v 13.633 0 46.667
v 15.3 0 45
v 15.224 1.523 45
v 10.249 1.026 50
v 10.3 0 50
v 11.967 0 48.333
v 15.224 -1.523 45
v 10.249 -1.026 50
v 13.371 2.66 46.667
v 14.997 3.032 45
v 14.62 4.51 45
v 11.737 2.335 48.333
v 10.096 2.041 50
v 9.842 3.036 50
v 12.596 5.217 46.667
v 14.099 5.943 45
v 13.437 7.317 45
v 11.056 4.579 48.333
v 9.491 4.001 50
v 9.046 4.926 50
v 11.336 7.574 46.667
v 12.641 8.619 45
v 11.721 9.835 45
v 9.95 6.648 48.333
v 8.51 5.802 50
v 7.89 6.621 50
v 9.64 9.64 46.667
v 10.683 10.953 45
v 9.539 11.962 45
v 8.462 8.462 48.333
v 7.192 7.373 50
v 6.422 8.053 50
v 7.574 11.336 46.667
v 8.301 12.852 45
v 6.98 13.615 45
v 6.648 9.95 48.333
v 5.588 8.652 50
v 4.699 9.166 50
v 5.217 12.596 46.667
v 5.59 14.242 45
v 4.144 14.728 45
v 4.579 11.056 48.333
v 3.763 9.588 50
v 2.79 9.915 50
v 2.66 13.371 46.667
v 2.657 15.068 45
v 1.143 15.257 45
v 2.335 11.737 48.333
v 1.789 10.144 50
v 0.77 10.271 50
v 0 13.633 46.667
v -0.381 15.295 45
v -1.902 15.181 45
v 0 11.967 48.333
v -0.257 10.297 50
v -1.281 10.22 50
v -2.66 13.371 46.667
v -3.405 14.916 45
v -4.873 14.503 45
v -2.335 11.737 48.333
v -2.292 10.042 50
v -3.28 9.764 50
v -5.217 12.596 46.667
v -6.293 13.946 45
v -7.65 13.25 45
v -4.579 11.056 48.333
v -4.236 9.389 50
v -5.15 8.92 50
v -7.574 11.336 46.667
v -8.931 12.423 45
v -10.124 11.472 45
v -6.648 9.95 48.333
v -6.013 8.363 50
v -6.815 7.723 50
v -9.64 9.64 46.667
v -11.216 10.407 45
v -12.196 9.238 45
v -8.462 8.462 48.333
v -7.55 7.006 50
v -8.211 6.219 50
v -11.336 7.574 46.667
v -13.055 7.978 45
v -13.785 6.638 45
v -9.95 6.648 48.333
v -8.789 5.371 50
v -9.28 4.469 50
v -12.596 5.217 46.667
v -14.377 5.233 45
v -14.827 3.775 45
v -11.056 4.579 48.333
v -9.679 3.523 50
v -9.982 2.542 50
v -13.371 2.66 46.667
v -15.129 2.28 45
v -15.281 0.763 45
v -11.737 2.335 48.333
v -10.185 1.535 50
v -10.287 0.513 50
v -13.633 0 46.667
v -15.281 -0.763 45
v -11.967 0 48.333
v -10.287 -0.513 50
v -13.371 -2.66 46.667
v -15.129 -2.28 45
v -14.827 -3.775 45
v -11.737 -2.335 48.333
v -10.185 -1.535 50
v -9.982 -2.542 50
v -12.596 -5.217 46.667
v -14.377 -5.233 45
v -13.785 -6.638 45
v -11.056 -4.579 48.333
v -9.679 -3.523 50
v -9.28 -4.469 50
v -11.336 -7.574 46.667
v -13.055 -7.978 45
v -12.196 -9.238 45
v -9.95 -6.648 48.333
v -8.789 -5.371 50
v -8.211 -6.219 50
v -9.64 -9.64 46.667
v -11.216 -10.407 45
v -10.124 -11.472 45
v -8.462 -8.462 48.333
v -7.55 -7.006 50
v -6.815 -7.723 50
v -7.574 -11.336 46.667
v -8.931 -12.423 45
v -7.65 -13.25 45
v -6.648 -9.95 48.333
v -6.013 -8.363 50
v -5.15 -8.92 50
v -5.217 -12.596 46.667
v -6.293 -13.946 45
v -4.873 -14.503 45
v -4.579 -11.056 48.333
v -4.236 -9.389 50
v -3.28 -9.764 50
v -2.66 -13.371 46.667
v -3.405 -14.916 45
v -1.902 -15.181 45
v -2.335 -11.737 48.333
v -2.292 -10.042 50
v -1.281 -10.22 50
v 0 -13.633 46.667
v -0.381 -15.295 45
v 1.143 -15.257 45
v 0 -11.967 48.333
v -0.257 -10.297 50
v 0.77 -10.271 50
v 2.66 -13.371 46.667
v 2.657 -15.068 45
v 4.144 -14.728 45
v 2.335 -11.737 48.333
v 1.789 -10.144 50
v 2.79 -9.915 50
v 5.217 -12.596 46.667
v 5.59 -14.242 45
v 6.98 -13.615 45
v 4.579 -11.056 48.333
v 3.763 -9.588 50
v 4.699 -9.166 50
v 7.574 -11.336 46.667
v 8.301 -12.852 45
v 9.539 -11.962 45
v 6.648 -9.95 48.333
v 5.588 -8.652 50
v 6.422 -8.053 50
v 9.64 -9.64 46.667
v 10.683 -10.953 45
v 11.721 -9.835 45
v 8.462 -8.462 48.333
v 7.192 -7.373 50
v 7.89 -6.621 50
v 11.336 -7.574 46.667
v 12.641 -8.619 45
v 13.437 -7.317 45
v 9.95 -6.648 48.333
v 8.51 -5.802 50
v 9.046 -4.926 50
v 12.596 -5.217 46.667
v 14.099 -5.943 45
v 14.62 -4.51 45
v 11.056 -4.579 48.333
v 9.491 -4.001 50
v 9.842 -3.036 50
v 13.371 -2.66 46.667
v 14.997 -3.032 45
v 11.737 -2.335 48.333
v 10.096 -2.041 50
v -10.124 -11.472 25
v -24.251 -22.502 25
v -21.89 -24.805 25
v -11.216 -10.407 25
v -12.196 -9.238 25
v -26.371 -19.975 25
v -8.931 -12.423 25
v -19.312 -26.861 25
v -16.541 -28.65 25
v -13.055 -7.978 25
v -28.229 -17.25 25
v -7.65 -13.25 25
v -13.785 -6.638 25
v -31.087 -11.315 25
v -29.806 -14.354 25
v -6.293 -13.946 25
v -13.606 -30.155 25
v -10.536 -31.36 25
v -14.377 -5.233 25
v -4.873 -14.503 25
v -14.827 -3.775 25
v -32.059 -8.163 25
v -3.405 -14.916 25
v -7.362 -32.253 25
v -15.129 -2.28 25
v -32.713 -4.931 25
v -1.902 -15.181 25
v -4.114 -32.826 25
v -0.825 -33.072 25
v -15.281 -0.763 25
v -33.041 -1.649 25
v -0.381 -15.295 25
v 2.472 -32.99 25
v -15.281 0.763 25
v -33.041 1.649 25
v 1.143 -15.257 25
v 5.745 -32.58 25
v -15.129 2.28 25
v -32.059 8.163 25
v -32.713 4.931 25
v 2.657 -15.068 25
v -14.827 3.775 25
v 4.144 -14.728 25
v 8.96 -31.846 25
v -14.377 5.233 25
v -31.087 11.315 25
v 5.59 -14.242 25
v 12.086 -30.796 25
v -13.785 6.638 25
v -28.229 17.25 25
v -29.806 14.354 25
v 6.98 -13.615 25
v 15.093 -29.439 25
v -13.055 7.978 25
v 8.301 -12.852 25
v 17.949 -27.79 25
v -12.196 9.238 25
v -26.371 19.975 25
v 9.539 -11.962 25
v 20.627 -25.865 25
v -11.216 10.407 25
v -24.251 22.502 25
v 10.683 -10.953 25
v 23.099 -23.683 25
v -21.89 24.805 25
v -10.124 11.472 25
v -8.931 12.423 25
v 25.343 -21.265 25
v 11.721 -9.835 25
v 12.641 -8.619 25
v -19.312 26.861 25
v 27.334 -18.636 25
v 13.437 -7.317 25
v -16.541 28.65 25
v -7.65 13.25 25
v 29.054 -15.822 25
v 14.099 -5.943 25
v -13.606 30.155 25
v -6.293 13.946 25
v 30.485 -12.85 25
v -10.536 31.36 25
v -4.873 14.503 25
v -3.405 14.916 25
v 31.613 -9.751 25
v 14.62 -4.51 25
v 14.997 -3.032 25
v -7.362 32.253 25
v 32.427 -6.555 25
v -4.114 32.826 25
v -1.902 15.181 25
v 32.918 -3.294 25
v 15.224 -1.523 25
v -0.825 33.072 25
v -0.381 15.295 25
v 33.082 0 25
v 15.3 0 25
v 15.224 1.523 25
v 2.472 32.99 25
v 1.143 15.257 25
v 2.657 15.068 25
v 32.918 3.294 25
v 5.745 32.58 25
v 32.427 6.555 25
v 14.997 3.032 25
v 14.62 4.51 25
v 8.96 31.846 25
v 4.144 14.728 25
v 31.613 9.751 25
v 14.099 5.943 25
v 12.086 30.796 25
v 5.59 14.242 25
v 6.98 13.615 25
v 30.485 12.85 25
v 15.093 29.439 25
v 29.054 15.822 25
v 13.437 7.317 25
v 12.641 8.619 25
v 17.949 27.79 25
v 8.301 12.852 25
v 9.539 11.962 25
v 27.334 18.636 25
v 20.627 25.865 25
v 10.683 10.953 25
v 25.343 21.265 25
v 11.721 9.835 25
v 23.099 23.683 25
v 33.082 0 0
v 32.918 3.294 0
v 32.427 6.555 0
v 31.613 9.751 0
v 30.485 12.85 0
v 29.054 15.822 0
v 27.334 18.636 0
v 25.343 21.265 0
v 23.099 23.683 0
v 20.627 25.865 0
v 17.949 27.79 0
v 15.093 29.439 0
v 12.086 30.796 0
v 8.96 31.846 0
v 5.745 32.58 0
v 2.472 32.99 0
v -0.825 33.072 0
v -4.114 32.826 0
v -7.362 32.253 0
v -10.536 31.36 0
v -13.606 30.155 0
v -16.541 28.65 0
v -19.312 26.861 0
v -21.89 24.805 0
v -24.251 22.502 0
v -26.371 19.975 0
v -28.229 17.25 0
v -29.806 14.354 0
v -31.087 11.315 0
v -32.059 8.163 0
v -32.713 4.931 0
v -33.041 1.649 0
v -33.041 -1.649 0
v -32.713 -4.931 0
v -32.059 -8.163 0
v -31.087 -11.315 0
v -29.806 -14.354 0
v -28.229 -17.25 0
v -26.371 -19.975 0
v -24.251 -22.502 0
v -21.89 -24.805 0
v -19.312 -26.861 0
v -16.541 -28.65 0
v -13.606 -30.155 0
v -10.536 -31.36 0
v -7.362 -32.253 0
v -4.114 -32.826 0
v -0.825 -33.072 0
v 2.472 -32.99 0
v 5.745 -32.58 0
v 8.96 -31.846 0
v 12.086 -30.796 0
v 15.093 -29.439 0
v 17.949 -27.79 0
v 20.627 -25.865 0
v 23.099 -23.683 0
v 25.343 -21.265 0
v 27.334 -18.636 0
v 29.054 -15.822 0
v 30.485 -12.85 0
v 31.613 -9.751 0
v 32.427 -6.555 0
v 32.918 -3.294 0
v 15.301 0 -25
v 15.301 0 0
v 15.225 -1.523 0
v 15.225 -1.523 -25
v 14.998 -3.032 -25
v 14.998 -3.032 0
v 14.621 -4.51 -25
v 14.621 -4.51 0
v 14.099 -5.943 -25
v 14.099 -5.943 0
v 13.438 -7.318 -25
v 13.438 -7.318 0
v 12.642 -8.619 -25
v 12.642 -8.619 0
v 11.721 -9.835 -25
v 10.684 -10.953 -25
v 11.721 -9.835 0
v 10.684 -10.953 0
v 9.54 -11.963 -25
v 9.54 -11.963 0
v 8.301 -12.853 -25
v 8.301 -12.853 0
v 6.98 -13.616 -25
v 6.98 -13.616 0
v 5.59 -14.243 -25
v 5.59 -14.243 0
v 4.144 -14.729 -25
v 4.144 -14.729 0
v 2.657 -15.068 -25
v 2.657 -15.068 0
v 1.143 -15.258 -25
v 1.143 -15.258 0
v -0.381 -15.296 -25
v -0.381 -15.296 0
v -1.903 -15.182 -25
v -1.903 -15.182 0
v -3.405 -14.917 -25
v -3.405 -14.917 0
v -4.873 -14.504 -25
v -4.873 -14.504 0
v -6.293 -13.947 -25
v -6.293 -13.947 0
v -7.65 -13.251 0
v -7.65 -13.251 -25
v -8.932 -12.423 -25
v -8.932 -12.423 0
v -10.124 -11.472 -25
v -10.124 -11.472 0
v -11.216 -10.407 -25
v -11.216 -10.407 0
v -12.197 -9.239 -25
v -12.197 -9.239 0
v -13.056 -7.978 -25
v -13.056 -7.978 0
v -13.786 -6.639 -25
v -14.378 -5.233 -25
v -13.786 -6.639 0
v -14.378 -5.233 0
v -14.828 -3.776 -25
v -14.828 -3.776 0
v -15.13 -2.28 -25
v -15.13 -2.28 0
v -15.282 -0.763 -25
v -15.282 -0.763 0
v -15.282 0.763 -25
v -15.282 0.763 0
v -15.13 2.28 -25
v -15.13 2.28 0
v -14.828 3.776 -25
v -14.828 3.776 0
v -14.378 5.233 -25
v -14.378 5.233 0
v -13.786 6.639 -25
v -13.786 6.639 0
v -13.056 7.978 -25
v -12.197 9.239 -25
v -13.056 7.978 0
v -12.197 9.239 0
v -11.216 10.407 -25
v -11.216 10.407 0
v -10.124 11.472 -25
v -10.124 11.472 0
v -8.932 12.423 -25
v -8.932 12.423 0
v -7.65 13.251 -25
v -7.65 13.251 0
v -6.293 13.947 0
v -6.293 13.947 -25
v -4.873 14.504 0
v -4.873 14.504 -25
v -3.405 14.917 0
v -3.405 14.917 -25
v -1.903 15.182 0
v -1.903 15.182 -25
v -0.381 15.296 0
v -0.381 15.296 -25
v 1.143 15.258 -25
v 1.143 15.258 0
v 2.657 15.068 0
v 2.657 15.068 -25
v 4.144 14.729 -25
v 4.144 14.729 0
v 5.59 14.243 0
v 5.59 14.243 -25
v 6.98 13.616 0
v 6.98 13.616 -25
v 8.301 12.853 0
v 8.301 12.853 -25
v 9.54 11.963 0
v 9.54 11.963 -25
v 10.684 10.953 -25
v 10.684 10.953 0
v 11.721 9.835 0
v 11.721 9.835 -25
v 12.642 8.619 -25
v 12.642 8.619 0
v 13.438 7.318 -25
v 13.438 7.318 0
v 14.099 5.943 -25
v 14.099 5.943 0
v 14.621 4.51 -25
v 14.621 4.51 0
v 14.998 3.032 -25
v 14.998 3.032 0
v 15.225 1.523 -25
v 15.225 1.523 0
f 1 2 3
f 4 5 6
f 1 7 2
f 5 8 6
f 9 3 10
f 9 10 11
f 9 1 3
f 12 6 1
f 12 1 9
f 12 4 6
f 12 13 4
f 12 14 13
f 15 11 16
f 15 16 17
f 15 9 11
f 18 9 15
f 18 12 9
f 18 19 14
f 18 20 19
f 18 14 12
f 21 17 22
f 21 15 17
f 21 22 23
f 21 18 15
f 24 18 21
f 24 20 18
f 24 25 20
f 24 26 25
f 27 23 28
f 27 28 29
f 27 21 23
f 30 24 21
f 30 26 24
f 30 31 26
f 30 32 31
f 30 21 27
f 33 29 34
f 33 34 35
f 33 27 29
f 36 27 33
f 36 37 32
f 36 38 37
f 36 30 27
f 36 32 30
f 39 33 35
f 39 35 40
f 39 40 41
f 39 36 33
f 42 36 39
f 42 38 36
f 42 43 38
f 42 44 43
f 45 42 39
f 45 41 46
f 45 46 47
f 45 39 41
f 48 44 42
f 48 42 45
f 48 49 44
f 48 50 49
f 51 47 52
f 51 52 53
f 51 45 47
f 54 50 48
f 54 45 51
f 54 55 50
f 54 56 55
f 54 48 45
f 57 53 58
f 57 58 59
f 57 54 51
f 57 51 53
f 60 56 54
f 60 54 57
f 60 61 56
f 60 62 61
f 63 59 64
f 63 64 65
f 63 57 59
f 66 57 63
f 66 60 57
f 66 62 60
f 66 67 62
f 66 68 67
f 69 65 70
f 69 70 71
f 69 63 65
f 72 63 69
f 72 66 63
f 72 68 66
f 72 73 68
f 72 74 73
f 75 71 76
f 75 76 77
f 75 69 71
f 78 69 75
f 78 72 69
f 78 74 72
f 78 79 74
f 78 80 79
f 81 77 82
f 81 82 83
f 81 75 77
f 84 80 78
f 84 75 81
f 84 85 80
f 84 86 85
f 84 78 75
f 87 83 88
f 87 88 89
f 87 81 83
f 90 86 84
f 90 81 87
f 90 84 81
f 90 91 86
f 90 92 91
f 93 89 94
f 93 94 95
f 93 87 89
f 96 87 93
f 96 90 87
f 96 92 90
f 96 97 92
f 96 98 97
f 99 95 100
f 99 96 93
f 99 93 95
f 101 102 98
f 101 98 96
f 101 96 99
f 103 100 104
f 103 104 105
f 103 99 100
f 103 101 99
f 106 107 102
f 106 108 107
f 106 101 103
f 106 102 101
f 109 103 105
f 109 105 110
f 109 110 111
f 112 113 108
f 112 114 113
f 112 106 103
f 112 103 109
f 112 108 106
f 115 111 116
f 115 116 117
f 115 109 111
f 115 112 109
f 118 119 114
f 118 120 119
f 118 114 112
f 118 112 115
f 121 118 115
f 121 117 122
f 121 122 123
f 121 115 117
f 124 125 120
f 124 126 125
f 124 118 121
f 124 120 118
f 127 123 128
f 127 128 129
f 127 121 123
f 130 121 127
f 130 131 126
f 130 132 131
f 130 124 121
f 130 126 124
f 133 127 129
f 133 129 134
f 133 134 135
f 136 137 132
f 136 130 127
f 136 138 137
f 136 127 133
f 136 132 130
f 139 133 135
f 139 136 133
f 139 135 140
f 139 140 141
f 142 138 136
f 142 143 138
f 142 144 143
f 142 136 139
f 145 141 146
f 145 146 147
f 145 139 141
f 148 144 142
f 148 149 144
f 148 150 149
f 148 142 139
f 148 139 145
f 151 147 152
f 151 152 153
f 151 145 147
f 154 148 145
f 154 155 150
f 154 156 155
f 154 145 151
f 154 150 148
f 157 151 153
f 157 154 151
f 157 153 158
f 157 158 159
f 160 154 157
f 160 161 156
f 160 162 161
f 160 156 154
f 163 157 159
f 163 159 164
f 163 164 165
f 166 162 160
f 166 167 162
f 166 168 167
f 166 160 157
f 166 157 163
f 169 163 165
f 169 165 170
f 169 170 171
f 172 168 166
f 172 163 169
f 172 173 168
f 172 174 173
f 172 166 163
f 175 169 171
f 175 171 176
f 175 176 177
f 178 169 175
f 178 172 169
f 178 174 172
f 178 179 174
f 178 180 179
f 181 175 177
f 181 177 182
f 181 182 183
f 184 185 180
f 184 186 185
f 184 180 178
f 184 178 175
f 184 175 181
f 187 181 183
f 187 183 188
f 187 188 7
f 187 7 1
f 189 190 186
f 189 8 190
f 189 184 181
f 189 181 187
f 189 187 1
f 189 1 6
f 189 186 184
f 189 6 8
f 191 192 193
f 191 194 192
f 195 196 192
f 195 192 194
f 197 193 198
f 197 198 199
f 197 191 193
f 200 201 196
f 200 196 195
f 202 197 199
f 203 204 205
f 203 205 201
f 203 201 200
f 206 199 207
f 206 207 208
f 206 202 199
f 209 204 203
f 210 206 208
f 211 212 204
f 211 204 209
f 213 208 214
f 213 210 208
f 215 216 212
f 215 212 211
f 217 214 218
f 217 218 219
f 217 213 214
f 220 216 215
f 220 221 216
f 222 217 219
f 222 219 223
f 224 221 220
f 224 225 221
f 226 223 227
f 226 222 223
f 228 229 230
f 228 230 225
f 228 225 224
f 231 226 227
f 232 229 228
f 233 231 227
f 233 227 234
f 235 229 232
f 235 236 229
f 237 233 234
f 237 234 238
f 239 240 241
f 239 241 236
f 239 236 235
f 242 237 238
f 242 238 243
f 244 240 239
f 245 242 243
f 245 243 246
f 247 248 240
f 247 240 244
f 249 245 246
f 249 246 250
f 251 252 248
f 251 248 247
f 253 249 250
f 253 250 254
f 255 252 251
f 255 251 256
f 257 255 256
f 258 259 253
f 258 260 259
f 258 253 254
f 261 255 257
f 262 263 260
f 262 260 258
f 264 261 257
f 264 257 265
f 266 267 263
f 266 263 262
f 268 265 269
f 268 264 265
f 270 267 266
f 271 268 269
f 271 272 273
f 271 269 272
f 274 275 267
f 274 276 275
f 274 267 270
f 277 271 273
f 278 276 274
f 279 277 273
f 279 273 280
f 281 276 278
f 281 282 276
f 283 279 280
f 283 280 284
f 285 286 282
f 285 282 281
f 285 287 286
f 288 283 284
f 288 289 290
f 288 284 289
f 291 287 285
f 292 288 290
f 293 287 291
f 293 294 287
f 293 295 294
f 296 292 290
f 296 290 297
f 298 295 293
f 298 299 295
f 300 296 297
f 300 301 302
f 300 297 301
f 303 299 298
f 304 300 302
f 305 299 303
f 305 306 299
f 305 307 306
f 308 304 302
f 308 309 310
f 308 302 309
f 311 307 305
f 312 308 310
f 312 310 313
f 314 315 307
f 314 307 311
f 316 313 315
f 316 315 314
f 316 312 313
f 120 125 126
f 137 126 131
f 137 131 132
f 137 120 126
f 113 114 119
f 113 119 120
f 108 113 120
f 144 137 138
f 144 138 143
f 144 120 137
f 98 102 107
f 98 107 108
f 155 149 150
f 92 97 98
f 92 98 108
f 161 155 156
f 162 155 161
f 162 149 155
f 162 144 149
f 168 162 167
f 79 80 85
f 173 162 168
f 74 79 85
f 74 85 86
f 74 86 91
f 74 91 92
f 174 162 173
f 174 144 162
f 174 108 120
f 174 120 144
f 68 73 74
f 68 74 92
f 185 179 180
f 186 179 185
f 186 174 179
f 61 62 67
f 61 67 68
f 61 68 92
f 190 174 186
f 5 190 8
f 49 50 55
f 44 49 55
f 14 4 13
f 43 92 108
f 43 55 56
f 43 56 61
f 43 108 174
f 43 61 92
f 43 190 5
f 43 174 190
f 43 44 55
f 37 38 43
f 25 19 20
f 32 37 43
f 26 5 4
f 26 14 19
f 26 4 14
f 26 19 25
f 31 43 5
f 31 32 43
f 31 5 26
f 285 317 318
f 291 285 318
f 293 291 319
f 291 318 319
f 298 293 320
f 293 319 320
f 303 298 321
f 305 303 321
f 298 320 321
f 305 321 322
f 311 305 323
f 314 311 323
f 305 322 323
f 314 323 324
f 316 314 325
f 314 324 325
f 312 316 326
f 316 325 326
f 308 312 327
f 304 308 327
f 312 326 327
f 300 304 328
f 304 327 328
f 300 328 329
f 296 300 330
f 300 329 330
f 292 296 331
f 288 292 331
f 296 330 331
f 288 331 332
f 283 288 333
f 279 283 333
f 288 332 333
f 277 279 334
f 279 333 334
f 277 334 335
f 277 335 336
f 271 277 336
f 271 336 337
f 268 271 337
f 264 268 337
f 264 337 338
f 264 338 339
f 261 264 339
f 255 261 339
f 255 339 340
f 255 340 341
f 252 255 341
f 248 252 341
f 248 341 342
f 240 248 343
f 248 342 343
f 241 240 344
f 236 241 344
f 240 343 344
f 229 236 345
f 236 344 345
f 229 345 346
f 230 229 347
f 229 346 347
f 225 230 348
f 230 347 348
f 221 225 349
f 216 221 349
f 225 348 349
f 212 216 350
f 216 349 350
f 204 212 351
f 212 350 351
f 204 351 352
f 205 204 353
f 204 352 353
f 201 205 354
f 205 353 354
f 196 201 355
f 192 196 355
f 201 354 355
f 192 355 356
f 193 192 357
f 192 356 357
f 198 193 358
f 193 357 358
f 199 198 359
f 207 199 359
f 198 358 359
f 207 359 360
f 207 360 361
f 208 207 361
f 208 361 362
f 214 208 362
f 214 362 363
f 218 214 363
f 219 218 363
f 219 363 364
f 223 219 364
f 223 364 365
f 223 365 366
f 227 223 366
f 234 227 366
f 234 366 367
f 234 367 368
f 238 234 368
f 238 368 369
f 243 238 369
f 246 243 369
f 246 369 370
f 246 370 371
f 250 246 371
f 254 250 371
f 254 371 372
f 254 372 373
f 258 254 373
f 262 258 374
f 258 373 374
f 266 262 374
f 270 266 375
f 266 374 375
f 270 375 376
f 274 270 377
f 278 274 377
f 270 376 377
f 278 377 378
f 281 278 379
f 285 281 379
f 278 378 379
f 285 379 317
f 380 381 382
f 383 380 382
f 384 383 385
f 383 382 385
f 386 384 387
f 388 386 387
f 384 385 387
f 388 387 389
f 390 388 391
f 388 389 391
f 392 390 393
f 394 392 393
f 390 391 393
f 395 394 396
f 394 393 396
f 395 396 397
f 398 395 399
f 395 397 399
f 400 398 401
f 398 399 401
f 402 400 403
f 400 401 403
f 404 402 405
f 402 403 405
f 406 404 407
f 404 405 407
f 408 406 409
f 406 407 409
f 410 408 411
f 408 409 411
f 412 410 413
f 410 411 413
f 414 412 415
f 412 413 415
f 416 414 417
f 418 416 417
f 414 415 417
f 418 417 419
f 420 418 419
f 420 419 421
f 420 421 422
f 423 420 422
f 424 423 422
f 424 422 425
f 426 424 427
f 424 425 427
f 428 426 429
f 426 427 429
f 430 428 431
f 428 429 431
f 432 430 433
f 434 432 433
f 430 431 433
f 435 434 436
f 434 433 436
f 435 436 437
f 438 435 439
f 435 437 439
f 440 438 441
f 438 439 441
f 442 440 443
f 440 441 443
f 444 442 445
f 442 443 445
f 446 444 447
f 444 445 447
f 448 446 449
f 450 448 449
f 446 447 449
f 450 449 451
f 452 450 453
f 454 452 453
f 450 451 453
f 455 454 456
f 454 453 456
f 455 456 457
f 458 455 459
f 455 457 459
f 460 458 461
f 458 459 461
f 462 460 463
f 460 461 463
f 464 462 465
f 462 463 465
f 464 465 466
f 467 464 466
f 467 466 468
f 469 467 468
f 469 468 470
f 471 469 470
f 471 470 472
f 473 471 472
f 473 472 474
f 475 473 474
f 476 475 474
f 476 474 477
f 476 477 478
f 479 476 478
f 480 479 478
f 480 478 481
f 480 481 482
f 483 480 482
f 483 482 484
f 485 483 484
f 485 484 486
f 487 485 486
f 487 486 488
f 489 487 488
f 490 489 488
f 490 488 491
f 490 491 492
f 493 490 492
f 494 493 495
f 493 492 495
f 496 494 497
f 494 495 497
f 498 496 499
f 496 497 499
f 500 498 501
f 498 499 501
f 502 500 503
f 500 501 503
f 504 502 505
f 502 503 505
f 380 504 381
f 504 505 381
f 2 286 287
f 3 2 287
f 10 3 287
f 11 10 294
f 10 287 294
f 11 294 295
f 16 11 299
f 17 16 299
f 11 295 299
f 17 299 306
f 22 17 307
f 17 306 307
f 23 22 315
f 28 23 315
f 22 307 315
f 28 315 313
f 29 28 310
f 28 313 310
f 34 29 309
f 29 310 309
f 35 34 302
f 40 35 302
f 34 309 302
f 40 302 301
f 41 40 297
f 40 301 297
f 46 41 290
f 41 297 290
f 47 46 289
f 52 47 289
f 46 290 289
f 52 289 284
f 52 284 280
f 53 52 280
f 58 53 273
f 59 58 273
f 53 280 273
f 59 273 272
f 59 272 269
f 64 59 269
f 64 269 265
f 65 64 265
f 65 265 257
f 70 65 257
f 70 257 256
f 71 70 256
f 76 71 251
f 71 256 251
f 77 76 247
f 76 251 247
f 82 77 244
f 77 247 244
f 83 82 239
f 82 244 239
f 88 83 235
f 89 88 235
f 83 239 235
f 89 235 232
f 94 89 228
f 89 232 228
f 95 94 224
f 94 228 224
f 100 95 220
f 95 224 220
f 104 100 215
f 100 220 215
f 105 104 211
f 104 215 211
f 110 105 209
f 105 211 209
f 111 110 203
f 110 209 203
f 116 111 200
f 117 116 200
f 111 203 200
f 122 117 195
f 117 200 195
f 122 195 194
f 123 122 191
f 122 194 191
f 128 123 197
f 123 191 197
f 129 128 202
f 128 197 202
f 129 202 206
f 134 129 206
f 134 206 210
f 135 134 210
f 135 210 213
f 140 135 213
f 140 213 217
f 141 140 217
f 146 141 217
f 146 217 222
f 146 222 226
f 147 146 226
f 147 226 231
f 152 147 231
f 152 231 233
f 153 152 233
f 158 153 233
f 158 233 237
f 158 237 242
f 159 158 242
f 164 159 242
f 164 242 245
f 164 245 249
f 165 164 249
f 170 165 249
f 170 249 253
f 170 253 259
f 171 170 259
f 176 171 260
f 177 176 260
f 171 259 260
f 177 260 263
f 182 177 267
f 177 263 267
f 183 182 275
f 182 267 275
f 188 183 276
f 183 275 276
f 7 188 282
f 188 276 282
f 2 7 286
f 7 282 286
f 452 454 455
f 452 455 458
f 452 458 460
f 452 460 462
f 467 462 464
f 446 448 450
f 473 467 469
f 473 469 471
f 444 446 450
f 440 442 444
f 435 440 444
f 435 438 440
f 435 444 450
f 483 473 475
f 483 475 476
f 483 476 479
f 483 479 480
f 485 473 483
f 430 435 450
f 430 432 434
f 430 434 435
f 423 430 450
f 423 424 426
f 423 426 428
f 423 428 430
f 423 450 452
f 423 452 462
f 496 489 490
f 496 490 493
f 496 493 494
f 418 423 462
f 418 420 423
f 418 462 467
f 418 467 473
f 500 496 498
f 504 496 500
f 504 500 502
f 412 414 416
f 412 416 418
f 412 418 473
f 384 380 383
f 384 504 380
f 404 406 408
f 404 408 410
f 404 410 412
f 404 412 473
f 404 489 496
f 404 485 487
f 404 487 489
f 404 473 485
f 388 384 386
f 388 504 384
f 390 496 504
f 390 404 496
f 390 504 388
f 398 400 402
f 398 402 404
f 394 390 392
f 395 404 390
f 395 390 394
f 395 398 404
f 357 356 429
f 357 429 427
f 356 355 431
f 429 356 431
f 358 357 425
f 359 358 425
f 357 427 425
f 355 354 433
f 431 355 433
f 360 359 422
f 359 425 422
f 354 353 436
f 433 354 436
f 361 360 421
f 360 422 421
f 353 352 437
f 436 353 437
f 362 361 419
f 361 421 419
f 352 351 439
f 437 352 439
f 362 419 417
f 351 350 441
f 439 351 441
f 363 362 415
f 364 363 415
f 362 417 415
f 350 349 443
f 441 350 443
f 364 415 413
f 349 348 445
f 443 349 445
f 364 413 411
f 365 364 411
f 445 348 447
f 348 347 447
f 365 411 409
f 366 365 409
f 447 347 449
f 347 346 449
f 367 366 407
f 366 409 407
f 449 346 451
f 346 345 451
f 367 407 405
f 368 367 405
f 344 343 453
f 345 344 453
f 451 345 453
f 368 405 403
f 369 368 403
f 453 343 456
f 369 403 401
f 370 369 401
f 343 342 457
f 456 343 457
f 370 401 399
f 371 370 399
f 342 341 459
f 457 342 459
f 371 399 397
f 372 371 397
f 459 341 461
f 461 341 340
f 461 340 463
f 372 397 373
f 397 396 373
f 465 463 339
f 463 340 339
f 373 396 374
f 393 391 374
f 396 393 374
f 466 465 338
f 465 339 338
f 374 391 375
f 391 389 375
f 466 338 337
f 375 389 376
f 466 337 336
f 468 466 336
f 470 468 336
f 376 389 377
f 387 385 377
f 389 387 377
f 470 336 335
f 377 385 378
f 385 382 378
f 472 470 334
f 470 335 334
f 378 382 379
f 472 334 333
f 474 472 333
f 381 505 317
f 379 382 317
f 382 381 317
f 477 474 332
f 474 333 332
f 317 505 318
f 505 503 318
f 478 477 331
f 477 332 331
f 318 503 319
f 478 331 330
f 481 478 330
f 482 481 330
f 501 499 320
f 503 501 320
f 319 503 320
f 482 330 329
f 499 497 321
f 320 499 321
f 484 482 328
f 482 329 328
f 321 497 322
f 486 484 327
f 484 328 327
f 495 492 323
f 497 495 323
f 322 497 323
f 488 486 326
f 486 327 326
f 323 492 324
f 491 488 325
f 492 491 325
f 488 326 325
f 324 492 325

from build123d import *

# Parameters (mm, degrees)
F0_R     = 33.082468
F1_DEPTH = 25
F2_R     = 15.300047
F3_DEPTH = 25
F4_SIZE  = 5
F5_R     = 15.3009
F6_DEPTH = 25


with BuildPart() as f1:
    # F0 (on Top) → F1 (new body)
    with BuildSketch(Plane.XY):
        Circle(F0_R)
    extrude(amount=F1_DEPTH)

    # F2 (on face) → F3 (join)
    with BuildSketch(Plane.XY.offset(25)):
        Circle(F2_R)
    extrude(amount=F3_DEPTH)

    # F4
    f4_edges = [f1.edges().sort_by_distance(p)[0] for p in [
        (-15.300047, 0, 50),
    ]]
    chamfer(f4_edges, length=F4_SIZE)

    # F5 (on face) → F6 (join)
    with BuildSketch(Plane(origin=(0, 0, 0), x_dir=(1, 0, 0), z_dir=(0, 0, -1))):
        Circle(F5_R)
    extrude(amount=F6_DEPTH)


solid = f1.part
